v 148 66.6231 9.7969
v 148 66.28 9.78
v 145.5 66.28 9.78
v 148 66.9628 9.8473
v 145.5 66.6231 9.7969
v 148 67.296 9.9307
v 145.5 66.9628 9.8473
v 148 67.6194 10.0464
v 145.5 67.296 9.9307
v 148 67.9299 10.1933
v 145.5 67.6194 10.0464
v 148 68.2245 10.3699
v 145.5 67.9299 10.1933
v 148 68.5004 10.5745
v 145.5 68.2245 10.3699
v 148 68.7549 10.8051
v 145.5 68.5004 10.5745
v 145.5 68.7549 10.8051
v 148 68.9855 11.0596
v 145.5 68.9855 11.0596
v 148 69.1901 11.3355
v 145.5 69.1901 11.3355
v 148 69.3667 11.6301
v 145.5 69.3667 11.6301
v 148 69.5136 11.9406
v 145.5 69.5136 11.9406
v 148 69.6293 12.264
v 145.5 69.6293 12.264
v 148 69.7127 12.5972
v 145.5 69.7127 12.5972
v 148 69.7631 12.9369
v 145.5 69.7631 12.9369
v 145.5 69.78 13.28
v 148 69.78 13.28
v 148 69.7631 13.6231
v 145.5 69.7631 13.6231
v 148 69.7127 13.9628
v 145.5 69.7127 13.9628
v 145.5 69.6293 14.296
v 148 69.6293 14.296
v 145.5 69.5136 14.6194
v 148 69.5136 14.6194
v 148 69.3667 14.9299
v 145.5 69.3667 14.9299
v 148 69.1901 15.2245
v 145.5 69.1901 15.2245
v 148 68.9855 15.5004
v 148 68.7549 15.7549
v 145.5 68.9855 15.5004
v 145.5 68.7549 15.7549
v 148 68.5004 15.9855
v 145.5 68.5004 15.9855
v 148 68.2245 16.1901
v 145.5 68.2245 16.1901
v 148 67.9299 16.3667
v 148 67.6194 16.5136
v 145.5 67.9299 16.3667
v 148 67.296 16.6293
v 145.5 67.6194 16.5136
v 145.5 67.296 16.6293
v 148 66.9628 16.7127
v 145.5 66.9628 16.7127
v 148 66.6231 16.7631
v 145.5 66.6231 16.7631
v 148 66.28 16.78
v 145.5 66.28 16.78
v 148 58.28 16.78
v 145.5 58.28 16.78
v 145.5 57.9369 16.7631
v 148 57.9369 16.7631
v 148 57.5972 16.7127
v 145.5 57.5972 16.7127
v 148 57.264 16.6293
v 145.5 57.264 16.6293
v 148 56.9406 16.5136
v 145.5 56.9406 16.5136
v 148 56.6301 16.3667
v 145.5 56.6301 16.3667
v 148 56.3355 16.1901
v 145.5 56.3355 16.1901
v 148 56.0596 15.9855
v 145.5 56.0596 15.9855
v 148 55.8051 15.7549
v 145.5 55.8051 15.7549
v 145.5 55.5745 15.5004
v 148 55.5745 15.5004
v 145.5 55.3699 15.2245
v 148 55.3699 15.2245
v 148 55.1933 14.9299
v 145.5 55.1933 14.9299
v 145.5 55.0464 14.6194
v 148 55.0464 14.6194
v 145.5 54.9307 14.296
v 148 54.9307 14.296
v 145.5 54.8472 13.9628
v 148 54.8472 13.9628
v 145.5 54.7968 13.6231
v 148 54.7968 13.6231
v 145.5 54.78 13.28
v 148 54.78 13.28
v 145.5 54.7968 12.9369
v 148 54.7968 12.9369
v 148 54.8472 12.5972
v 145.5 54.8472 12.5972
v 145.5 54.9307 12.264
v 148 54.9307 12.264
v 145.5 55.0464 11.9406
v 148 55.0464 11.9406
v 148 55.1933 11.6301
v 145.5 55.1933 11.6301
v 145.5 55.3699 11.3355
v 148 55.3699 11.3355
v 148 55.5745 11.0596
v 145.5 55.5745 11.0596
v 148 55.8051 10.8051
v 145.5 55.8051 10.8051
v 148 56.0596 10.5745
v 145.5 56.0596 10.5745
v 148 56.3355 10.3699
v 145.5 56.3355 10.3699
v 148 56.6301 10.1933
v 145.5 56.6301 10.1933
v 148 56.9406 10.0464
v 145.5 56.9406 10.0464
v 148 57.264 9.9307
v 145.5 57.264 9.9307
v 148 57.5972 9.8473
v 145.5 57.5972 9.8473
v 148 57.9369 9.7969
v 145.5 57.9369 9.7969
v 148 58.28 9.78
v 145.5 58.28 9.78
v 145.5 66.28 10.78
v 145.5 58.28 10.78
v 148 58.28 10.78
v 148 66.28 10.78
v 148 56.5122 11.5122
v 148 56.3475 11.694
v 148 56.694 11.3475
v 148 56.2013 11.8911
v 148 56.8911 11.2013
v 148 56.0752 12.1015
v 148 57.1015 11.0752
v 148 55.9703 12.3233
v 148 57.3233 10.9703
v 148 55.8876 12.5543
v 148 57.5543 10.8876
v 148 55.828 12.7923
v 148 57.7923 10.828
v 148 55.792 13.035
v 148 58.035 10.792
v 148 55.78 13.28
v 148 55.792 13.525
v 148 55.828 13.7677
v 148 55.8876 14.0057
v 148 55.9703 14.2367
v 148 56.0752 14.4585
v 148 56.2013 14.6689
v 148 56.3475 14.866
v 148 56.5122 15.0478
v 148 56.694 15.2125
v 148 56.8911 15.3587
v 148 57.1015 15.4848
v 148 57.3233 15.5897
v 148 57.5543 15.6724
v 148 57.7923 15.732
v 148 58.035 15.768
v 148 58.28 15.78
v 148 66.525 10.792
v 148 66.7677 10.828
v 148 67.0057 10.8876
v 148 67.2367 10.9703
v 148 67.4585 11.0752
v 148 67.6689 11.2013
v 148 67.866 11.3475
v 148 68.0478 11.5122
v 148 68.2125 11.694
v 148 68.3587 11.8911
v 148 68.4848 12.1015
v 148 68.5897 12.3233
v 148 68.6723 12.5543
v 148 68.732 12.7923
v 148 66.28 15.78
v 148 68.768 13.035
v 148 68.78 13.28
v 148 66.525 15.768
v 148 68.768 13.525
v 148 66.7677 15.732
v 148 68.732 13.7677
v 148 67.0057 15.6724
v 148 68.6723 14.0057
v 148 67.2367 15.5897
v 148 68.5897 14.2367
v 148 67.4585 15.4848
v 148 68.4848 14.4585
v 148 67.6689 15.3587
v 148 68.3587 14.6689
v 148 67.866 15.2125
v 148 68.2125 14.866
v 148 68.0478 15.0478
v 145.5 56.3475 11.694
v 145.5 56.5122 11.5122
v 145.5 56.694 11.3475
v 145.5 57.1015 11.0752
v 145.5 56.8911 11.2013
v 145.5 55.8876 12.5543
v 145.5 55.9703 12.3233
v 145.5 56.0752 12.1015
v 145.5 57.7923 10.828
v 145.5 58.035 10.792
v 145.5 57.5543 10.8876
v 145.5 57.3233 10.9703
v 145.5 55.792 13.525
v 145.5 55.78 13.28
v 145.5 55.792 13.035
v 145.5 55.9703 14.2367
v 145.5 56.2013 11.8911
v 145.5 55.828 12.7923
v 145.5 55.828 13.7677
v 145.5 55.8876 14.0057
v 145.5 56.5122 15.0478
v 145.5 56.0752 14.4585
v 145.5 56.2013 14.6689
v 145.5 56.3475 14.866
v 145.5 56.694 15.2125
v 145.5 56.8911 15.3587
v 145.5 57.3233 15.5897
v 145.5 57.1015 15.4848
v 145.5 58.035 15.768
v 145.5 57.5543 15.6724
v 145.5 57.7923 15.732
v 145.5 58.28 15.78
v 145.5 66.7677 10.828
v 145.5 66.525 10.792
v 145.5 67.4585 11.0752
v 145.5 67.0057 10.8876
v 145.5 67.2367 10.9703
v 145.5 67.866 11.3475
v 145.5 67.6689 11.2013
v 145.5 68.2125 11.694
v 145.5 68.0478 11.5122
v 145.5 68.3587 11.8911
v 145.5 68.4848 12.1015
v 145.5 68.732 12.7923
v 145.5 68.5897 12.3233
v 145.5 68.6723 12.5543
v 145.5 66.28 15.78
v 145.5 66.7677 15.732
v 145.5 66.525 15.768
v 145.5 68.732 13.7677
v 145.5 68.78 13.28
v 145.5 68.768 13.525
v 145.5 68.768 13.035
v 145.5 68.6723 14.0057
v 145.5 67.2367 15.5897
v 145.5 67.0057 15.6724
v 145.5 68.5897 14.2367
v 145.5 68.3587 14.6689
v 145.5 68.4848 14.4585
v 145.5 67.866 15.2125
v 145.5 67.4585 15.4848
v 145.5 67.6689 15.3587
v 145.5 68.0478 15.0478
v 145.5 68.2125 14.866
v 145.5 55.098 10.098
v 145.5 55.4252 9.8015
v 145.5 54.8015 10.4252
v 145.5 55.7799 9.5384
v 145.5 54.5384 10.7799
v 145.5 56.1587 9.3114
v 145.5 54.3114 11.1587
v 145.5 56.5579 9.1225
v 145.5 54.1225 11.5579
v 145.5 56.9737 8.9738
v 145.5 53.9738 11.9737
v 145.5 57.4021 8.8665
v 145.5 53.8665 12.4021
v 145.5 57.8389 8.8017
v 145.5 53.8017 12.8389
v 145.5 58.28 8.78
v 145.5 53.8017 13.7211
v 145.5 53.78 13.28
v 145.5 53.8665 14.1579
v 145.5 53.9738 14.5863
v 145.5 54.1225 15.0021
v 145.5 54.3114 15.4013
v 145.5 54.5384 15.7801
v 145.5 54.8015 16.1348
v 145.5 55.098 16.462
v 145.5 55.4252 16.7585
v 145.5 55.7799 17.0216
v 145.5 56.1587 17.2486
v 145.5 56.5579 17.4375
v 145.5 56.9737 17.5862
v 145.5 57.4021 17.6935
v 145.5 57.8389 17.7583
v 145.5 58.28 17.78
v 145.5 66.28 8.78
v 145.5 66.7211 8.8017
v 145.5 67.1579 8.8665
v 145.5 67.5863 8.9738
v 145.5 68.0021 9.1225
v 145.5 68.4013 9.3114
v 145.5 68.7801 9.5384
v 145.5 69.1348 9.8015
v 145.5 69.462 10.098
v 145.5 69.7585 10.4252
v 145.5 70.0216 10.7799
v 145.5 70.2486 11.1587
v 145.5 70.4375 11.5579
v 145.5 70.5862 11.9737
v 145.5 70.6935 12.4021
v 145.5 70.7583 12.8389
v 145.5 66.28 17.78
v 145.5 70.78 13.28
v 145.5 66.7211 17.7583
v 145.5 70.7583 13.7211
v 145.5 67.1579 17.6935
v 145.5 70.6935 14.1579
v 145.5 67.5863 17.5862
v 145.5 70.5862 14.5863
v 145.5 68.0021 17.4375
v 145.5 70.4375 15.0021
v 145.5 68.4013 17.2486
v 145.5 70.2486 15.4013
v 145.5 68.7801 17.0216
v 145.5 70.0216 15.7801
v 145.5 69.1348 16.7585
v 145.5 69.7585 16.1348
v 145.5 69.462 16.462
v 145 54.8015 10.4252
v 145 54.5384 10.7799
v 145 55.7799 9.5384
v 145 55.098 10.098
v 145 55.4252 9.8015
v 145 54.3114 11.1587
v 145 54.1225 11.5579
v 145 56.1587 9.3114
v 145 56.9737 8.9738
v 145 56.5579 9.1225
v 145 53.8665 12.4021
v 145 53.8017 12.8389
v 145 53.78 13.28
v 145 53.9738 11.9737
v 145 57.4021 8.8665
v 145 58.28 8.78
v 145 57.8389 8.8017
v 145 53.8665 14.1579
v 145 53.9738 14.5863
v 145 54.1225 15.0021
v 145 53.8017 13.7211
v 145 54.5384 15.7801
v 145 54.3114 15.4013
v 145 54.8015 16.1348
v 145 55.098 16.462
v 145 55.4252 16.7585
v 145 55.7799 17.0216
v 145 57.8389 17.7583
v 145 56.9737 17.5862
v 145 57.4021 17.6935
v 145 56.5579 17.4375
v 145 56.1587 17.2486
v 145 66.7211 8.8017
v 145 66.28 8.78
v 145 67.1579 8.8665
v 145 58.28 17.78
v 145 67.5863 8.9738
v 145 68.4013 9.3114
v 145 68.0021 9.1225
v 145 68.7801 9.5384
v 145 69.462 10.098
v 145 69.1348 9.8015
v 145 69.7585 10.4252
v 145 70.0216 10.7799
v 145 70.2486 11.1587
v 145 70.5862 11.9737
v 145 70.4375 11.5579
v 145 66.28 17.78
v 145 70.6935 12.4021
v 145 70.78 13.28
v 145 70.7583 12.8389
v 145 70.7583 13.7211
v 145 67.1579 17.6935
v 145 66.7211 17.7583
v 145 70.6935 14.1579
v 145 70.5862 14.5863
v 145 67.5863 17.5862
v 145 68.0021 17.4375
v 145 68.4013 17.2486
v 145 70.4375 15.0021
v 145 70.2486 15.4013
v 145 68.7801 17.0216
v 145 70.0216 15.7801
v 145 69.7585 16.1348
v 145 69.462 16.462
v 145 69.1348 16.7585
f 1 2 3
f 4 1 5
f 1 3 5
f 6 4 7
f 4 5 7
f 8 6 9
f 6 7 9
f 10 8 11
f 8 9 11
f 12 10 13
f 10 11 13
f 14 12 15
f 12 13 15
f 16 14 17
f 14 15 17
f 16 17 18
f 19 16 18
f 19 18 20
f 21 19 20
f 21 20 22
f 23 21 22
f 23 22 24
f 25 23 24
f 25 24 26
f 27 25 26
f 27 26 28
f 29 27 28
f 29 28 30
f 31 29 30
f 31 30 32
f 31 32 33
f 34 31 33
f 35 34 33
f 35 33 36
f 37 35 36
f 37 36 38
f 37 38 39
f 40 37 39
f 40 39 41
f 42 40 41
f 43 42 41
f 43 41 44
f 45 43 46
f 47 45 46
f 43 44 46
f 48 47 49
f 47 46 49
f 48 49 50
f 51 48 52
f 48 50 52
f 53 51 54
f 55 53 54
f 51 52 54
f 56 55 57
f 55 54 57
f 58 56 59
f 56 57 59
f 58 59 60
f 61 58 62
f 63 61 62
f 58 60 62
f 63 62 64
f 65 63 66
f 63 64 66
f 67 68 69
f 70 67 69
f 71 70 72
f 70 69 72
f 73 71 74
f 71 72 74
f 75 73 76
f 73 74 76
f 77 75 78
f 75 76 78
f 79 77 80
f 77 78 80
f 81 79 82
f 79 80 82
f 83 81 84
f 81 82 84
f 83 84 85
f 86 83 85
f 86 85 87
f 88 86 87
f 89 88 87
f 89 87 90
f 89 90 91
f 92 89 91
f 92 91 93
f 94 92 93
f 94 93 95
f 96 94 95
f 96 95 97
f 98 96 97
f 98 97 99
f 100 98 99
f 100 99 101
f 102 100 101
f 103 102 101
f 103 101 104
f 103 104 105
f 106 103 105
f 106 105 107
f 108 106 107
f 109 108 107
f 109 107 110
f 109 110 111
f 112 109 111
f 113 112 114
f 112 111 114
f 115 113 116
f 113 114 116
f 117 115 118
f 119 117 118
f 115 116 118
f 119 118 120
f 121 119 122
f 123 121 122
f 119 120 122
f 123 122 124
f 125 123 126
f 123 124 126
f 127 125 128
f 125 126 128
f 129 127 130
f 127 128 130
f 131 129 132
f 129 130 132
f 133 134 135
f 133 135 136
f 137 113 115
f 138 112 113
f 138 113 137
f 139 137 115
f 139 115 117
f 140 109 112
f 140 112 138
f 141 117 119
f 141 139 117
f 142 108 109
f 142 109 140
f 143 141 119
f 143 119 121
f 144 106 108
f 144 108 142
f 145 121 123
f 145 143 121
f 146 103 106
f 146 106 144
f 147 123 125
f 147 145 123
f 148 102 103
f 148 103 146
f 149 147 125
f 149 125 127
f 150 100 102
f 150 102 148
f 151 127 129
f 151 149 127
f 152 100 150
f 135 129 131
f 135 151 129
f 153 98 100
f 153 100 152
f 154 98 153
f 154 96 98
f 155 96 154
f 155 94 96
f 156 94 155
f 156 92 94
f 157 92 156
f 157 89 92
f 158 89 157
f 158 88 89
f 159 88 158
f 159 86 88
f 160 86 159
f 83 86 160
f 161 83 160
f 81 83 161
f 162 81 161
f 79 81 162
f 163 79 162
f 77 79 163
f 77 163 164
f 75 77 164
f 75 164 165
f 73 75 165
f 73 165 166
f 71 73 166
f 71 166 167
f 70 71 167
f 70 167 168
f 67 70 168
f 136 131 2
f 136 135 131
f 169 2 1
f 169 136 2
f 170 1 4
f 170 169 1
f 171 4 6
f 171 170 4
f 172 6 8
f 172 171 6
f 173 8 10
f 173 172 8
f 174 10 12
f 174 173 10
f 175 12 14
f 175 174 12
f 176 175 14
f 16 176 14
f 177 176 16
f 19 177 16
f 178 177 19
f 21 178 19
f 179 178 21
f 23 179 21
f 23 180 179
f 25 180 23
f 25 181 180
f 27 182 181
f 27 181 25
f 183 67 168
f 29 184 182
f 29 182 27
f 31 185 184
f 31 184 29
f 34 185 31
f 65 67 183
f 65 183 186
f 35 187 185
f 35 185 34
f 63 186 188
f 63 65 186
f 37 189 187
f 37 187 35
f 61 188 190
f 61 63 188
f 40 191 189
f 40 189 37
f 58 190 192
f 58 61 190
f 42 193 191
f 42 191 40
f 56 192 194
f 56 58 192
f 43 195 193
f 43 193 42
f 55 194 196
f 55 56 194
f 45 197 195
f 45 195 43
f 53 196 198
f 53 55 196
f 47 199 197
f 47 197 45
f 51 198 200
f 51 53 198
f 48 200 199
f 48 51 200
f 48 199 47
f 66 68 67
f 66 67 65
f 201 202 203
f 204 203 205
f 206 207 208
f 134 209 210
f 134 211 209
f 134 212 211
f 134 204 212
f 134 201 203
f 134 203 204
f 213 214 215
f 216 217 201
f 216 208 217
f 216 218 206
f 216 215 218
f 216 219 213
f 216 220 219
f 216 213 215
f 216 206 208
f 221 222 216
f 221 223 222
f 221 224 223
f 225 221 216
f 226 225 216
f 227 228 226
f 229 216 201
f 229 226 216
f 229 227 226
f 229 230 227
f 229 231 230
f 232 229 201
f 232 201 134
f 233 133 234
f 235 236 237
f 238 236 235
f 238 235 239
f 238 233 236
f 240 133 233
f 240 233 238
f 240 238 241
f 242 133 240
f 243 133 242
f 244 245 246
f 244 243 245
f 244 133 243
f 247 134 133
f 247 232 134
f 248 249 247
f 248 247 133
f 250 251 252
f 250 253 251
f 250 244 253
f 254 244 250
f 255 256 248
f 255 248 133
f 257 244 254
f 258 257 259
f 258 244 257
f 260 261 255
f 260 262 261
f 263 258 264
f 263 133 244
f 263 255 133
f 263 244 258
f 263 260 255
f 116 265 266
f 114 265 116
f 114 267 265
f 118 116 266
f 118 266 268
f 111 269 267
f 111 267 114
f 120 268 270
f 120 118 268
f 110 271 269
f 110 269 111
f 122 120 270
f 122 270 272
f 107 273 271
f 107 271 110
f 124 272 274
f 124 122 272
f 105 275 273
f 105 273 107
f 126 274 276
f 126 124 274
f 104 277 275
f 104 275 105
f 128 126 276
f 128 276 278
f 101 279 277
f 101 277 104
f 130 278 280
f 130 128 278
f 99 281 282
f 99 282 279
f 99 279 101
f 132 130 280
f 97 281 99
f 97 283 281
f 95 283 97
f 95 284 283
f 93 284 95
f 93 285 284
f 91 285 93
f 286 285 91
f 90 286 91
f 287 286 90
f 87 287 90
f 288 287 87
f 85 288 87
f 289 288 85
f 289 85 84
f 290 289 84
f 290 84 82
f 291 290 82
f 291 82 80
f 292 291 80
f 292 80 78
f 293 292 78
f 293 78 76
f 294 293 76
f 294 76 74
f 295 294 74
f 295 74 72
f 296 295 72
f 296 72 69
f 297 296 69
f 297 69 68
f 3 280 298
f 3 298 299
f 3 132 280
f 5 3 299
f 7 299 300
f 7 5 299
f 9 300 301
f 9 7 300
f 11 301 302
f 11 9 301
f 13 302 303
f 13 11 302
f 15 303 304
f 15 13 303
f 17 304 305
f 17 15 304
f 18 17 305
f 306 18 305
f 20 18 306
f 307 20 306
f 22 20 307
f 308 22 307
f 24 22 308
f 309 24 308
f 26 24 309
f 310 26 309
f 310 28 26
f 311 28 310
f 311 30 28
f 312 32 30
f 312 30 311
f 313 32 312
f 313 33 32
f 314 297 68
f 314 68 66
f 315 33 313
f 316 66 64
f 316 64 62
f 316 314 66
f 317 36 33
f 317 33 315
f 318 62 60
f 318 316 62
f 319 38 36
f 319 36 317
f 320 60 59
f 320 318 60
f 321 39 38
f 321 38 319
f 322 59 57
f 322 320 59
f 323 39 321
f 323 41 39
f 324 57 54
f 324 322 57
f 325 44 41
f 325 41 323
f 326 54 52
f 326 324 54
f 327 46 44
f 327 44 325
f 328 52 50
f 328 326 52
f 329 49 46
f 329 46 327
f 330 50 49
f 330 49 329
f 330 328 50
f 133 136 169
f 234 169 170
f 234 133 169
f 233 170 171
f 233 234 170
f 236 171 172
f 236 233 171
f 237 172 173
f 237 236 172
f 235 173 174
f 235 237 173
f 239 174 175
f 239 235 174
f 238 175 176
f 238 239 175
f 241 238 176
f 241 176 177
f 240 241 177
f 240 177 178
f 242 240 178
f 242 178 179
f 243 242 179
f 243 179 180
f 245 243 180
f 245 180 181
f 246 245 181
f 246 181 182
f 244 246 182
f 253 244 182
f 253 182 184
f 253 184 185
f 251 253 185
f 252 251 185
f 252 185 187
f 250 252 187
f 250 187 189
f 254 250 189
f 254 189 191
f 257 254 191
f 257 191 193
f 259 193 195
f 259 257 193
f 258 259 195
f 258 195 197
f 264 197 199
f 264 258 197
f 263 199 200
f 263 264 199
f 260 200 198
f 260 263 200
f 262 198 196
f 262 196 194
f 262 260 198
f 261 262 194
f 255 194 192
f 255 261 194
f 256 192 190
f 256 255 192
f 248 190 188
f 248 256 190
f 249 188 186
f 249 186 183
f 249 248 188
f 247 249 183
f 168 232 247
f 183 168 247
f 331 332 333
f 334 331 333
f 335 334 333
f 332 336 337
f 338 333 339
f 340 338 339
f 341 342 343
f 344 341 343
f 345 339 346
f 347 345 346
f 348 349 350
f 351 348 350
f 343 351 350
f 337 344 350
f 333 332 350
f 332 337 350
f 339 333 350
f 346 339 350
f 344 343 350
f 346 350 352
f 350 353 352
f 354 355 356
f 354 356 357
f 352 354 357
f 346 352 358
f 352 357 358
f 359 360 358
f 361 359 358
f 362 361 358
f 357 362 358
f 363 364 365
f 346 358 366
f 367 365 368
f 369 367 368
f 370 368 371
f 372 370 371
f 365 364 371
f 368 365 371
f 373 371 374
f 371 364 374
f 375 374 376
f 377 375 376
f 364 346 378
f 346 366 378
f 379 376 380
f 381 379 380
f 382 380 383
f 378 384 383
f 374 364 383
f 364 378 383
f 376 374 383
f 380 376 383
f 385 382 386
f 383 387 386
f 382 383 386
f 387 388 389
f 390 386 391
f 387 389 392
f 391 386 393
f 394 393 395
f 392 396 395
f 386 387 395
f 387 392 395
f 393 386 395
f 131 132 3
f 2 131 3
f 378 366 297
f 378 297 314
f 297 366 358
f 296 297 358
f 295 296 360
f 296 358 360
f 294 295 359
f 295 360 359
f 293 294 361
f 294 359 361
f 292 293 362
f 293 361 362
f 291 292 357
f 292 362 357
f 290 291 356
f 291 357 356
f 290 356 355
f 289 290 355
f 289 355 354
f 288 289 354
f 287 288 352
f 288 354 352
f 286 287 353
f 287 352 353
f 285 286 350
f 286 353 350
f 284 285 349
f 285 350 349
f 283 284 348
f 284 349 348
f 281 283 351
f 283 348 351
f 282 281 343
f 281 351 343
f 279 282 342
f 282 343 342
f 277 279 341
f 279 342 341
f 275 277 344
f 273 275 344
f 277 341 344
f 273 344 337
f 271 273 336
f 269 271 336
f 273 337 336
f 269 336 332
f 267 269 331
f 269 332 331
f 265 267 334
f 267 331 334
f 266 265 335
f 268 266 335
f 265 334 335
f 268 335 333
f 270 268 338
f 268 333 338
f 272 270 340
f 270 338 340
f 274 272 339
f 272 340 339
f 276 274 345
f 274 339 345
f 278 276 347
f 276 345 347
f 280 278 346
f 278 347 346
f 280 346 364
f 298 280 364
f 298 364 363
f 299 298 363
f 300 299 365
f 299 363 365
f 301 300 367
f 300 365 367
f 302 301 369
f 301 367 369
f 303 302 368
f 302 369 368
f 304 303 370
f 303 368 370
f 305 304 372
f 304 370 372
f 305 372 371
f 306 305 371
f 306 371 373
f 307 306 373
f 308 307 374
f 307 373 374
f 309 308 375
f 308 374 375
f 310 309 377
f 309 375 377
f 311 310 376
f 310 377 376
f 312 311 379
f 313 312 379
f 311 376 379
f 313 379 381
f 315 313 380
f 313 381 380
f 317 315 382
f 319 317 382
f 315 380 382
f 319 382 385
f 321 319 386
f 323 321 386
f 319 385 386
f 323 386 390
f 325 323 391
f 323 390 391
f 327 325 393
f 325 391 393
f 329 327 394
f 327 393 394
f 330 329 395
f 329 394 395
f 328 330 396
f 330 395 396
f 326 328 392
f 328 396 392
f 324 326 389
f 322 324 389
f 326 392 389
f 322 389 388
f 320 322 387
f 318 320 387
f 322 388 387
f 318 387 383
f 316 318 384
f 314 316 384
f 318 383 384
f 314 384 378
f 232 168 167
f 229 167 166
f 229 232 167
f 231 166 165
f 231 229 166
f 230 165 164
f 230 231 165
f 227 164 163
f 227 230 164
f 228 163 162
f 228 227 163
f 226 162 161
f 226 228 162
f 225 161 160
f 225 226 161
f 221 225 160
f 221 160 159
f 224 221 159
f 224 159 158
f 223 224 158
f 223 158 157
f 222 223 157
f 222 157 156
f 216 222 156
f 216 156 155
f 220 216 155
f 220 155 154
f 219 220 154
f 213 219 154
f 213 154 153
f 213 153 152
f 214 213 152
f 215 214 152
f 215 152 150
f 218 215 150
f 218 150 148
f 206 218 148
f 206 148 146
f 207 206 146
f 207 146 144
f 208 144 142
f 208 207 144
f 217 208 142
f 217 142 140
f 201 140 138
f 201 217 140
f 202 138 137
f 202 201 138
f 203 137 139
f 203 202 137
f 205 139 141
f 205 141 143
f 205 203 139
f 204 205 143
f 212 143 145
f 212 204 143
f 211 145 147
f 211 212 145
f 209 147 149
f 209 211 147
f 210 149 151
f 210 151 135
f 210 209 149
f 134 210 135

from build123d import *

# Parameters (mm, degrees)
EXTRUDE002_DEPTH = 0.5
EXTRUDE001_DEPTH = 3


with BuildPart() as extrude002:
    # Sketch002 → Extrude002 (new body)
    with BuildSketch(Plane.YZ):
        with BuildLine():
            Line((58.28, 3.78), (66.28, 3.78))
            ThreePointArc((66.28, 3.78), (70.780004, 8.28), (66.28, 12.78))
            Line((58.28, 12.78), (66.28, 12.78))
            ThreePointArc((58.28, 12.78), (53.779996, 8.28), (58.28, 3.78))
        make_face()
    extrude(amount=EXTRUDE002_DEPTH)


with BuildPart() as extrude002_1:
    # Extrude002 placement: moved
    add(extrude002.part.moved(Location((145, 0, 5))))


with BuildPart() as usb_tap:
    # Sketch001 → Extrude001 (new body)
    with BuildSketch(Plane.YZ):
        with BuildLine():
            Line((58.28, 4.78), (66.28, 4.78))
            ThreePointArc((66.28, 4.78), (69.779995, 8.28), (66.28, 11.78))
            Line((58.28, 11.78), (66.28, 11.78))
            ThreePointArc((58.28, 11.78), (54.779995, 8.28), (58.28, 4.78))
        make_face()
        with BuildLine():
            ThreePointArc((58.279995, 10.78), (55.779995, 8.28), (58.279995, 5.78))
            Line((58.279995, 5.78), (66.279995, 5.78))
            ThreePointArc((66.279995, 5.78), (68.779995, 8.28), (66.279995, 10.78))
            Line((58.279995, 10.78), (66.279995, 10.78))
        make_face(mode=Mode.SUBTRACT)
    extrude(amount=EXTRUDE001_DEPTH)


with BuildPart() as usb_tap_1:
    # Extrude001 placement: moved
    add(usb_tap.part.moved(Location((145, 0, 5))))

    # Fusion062: union Extrude002
    add(extrude002_1.part)


solid = usb_tap_1.part
